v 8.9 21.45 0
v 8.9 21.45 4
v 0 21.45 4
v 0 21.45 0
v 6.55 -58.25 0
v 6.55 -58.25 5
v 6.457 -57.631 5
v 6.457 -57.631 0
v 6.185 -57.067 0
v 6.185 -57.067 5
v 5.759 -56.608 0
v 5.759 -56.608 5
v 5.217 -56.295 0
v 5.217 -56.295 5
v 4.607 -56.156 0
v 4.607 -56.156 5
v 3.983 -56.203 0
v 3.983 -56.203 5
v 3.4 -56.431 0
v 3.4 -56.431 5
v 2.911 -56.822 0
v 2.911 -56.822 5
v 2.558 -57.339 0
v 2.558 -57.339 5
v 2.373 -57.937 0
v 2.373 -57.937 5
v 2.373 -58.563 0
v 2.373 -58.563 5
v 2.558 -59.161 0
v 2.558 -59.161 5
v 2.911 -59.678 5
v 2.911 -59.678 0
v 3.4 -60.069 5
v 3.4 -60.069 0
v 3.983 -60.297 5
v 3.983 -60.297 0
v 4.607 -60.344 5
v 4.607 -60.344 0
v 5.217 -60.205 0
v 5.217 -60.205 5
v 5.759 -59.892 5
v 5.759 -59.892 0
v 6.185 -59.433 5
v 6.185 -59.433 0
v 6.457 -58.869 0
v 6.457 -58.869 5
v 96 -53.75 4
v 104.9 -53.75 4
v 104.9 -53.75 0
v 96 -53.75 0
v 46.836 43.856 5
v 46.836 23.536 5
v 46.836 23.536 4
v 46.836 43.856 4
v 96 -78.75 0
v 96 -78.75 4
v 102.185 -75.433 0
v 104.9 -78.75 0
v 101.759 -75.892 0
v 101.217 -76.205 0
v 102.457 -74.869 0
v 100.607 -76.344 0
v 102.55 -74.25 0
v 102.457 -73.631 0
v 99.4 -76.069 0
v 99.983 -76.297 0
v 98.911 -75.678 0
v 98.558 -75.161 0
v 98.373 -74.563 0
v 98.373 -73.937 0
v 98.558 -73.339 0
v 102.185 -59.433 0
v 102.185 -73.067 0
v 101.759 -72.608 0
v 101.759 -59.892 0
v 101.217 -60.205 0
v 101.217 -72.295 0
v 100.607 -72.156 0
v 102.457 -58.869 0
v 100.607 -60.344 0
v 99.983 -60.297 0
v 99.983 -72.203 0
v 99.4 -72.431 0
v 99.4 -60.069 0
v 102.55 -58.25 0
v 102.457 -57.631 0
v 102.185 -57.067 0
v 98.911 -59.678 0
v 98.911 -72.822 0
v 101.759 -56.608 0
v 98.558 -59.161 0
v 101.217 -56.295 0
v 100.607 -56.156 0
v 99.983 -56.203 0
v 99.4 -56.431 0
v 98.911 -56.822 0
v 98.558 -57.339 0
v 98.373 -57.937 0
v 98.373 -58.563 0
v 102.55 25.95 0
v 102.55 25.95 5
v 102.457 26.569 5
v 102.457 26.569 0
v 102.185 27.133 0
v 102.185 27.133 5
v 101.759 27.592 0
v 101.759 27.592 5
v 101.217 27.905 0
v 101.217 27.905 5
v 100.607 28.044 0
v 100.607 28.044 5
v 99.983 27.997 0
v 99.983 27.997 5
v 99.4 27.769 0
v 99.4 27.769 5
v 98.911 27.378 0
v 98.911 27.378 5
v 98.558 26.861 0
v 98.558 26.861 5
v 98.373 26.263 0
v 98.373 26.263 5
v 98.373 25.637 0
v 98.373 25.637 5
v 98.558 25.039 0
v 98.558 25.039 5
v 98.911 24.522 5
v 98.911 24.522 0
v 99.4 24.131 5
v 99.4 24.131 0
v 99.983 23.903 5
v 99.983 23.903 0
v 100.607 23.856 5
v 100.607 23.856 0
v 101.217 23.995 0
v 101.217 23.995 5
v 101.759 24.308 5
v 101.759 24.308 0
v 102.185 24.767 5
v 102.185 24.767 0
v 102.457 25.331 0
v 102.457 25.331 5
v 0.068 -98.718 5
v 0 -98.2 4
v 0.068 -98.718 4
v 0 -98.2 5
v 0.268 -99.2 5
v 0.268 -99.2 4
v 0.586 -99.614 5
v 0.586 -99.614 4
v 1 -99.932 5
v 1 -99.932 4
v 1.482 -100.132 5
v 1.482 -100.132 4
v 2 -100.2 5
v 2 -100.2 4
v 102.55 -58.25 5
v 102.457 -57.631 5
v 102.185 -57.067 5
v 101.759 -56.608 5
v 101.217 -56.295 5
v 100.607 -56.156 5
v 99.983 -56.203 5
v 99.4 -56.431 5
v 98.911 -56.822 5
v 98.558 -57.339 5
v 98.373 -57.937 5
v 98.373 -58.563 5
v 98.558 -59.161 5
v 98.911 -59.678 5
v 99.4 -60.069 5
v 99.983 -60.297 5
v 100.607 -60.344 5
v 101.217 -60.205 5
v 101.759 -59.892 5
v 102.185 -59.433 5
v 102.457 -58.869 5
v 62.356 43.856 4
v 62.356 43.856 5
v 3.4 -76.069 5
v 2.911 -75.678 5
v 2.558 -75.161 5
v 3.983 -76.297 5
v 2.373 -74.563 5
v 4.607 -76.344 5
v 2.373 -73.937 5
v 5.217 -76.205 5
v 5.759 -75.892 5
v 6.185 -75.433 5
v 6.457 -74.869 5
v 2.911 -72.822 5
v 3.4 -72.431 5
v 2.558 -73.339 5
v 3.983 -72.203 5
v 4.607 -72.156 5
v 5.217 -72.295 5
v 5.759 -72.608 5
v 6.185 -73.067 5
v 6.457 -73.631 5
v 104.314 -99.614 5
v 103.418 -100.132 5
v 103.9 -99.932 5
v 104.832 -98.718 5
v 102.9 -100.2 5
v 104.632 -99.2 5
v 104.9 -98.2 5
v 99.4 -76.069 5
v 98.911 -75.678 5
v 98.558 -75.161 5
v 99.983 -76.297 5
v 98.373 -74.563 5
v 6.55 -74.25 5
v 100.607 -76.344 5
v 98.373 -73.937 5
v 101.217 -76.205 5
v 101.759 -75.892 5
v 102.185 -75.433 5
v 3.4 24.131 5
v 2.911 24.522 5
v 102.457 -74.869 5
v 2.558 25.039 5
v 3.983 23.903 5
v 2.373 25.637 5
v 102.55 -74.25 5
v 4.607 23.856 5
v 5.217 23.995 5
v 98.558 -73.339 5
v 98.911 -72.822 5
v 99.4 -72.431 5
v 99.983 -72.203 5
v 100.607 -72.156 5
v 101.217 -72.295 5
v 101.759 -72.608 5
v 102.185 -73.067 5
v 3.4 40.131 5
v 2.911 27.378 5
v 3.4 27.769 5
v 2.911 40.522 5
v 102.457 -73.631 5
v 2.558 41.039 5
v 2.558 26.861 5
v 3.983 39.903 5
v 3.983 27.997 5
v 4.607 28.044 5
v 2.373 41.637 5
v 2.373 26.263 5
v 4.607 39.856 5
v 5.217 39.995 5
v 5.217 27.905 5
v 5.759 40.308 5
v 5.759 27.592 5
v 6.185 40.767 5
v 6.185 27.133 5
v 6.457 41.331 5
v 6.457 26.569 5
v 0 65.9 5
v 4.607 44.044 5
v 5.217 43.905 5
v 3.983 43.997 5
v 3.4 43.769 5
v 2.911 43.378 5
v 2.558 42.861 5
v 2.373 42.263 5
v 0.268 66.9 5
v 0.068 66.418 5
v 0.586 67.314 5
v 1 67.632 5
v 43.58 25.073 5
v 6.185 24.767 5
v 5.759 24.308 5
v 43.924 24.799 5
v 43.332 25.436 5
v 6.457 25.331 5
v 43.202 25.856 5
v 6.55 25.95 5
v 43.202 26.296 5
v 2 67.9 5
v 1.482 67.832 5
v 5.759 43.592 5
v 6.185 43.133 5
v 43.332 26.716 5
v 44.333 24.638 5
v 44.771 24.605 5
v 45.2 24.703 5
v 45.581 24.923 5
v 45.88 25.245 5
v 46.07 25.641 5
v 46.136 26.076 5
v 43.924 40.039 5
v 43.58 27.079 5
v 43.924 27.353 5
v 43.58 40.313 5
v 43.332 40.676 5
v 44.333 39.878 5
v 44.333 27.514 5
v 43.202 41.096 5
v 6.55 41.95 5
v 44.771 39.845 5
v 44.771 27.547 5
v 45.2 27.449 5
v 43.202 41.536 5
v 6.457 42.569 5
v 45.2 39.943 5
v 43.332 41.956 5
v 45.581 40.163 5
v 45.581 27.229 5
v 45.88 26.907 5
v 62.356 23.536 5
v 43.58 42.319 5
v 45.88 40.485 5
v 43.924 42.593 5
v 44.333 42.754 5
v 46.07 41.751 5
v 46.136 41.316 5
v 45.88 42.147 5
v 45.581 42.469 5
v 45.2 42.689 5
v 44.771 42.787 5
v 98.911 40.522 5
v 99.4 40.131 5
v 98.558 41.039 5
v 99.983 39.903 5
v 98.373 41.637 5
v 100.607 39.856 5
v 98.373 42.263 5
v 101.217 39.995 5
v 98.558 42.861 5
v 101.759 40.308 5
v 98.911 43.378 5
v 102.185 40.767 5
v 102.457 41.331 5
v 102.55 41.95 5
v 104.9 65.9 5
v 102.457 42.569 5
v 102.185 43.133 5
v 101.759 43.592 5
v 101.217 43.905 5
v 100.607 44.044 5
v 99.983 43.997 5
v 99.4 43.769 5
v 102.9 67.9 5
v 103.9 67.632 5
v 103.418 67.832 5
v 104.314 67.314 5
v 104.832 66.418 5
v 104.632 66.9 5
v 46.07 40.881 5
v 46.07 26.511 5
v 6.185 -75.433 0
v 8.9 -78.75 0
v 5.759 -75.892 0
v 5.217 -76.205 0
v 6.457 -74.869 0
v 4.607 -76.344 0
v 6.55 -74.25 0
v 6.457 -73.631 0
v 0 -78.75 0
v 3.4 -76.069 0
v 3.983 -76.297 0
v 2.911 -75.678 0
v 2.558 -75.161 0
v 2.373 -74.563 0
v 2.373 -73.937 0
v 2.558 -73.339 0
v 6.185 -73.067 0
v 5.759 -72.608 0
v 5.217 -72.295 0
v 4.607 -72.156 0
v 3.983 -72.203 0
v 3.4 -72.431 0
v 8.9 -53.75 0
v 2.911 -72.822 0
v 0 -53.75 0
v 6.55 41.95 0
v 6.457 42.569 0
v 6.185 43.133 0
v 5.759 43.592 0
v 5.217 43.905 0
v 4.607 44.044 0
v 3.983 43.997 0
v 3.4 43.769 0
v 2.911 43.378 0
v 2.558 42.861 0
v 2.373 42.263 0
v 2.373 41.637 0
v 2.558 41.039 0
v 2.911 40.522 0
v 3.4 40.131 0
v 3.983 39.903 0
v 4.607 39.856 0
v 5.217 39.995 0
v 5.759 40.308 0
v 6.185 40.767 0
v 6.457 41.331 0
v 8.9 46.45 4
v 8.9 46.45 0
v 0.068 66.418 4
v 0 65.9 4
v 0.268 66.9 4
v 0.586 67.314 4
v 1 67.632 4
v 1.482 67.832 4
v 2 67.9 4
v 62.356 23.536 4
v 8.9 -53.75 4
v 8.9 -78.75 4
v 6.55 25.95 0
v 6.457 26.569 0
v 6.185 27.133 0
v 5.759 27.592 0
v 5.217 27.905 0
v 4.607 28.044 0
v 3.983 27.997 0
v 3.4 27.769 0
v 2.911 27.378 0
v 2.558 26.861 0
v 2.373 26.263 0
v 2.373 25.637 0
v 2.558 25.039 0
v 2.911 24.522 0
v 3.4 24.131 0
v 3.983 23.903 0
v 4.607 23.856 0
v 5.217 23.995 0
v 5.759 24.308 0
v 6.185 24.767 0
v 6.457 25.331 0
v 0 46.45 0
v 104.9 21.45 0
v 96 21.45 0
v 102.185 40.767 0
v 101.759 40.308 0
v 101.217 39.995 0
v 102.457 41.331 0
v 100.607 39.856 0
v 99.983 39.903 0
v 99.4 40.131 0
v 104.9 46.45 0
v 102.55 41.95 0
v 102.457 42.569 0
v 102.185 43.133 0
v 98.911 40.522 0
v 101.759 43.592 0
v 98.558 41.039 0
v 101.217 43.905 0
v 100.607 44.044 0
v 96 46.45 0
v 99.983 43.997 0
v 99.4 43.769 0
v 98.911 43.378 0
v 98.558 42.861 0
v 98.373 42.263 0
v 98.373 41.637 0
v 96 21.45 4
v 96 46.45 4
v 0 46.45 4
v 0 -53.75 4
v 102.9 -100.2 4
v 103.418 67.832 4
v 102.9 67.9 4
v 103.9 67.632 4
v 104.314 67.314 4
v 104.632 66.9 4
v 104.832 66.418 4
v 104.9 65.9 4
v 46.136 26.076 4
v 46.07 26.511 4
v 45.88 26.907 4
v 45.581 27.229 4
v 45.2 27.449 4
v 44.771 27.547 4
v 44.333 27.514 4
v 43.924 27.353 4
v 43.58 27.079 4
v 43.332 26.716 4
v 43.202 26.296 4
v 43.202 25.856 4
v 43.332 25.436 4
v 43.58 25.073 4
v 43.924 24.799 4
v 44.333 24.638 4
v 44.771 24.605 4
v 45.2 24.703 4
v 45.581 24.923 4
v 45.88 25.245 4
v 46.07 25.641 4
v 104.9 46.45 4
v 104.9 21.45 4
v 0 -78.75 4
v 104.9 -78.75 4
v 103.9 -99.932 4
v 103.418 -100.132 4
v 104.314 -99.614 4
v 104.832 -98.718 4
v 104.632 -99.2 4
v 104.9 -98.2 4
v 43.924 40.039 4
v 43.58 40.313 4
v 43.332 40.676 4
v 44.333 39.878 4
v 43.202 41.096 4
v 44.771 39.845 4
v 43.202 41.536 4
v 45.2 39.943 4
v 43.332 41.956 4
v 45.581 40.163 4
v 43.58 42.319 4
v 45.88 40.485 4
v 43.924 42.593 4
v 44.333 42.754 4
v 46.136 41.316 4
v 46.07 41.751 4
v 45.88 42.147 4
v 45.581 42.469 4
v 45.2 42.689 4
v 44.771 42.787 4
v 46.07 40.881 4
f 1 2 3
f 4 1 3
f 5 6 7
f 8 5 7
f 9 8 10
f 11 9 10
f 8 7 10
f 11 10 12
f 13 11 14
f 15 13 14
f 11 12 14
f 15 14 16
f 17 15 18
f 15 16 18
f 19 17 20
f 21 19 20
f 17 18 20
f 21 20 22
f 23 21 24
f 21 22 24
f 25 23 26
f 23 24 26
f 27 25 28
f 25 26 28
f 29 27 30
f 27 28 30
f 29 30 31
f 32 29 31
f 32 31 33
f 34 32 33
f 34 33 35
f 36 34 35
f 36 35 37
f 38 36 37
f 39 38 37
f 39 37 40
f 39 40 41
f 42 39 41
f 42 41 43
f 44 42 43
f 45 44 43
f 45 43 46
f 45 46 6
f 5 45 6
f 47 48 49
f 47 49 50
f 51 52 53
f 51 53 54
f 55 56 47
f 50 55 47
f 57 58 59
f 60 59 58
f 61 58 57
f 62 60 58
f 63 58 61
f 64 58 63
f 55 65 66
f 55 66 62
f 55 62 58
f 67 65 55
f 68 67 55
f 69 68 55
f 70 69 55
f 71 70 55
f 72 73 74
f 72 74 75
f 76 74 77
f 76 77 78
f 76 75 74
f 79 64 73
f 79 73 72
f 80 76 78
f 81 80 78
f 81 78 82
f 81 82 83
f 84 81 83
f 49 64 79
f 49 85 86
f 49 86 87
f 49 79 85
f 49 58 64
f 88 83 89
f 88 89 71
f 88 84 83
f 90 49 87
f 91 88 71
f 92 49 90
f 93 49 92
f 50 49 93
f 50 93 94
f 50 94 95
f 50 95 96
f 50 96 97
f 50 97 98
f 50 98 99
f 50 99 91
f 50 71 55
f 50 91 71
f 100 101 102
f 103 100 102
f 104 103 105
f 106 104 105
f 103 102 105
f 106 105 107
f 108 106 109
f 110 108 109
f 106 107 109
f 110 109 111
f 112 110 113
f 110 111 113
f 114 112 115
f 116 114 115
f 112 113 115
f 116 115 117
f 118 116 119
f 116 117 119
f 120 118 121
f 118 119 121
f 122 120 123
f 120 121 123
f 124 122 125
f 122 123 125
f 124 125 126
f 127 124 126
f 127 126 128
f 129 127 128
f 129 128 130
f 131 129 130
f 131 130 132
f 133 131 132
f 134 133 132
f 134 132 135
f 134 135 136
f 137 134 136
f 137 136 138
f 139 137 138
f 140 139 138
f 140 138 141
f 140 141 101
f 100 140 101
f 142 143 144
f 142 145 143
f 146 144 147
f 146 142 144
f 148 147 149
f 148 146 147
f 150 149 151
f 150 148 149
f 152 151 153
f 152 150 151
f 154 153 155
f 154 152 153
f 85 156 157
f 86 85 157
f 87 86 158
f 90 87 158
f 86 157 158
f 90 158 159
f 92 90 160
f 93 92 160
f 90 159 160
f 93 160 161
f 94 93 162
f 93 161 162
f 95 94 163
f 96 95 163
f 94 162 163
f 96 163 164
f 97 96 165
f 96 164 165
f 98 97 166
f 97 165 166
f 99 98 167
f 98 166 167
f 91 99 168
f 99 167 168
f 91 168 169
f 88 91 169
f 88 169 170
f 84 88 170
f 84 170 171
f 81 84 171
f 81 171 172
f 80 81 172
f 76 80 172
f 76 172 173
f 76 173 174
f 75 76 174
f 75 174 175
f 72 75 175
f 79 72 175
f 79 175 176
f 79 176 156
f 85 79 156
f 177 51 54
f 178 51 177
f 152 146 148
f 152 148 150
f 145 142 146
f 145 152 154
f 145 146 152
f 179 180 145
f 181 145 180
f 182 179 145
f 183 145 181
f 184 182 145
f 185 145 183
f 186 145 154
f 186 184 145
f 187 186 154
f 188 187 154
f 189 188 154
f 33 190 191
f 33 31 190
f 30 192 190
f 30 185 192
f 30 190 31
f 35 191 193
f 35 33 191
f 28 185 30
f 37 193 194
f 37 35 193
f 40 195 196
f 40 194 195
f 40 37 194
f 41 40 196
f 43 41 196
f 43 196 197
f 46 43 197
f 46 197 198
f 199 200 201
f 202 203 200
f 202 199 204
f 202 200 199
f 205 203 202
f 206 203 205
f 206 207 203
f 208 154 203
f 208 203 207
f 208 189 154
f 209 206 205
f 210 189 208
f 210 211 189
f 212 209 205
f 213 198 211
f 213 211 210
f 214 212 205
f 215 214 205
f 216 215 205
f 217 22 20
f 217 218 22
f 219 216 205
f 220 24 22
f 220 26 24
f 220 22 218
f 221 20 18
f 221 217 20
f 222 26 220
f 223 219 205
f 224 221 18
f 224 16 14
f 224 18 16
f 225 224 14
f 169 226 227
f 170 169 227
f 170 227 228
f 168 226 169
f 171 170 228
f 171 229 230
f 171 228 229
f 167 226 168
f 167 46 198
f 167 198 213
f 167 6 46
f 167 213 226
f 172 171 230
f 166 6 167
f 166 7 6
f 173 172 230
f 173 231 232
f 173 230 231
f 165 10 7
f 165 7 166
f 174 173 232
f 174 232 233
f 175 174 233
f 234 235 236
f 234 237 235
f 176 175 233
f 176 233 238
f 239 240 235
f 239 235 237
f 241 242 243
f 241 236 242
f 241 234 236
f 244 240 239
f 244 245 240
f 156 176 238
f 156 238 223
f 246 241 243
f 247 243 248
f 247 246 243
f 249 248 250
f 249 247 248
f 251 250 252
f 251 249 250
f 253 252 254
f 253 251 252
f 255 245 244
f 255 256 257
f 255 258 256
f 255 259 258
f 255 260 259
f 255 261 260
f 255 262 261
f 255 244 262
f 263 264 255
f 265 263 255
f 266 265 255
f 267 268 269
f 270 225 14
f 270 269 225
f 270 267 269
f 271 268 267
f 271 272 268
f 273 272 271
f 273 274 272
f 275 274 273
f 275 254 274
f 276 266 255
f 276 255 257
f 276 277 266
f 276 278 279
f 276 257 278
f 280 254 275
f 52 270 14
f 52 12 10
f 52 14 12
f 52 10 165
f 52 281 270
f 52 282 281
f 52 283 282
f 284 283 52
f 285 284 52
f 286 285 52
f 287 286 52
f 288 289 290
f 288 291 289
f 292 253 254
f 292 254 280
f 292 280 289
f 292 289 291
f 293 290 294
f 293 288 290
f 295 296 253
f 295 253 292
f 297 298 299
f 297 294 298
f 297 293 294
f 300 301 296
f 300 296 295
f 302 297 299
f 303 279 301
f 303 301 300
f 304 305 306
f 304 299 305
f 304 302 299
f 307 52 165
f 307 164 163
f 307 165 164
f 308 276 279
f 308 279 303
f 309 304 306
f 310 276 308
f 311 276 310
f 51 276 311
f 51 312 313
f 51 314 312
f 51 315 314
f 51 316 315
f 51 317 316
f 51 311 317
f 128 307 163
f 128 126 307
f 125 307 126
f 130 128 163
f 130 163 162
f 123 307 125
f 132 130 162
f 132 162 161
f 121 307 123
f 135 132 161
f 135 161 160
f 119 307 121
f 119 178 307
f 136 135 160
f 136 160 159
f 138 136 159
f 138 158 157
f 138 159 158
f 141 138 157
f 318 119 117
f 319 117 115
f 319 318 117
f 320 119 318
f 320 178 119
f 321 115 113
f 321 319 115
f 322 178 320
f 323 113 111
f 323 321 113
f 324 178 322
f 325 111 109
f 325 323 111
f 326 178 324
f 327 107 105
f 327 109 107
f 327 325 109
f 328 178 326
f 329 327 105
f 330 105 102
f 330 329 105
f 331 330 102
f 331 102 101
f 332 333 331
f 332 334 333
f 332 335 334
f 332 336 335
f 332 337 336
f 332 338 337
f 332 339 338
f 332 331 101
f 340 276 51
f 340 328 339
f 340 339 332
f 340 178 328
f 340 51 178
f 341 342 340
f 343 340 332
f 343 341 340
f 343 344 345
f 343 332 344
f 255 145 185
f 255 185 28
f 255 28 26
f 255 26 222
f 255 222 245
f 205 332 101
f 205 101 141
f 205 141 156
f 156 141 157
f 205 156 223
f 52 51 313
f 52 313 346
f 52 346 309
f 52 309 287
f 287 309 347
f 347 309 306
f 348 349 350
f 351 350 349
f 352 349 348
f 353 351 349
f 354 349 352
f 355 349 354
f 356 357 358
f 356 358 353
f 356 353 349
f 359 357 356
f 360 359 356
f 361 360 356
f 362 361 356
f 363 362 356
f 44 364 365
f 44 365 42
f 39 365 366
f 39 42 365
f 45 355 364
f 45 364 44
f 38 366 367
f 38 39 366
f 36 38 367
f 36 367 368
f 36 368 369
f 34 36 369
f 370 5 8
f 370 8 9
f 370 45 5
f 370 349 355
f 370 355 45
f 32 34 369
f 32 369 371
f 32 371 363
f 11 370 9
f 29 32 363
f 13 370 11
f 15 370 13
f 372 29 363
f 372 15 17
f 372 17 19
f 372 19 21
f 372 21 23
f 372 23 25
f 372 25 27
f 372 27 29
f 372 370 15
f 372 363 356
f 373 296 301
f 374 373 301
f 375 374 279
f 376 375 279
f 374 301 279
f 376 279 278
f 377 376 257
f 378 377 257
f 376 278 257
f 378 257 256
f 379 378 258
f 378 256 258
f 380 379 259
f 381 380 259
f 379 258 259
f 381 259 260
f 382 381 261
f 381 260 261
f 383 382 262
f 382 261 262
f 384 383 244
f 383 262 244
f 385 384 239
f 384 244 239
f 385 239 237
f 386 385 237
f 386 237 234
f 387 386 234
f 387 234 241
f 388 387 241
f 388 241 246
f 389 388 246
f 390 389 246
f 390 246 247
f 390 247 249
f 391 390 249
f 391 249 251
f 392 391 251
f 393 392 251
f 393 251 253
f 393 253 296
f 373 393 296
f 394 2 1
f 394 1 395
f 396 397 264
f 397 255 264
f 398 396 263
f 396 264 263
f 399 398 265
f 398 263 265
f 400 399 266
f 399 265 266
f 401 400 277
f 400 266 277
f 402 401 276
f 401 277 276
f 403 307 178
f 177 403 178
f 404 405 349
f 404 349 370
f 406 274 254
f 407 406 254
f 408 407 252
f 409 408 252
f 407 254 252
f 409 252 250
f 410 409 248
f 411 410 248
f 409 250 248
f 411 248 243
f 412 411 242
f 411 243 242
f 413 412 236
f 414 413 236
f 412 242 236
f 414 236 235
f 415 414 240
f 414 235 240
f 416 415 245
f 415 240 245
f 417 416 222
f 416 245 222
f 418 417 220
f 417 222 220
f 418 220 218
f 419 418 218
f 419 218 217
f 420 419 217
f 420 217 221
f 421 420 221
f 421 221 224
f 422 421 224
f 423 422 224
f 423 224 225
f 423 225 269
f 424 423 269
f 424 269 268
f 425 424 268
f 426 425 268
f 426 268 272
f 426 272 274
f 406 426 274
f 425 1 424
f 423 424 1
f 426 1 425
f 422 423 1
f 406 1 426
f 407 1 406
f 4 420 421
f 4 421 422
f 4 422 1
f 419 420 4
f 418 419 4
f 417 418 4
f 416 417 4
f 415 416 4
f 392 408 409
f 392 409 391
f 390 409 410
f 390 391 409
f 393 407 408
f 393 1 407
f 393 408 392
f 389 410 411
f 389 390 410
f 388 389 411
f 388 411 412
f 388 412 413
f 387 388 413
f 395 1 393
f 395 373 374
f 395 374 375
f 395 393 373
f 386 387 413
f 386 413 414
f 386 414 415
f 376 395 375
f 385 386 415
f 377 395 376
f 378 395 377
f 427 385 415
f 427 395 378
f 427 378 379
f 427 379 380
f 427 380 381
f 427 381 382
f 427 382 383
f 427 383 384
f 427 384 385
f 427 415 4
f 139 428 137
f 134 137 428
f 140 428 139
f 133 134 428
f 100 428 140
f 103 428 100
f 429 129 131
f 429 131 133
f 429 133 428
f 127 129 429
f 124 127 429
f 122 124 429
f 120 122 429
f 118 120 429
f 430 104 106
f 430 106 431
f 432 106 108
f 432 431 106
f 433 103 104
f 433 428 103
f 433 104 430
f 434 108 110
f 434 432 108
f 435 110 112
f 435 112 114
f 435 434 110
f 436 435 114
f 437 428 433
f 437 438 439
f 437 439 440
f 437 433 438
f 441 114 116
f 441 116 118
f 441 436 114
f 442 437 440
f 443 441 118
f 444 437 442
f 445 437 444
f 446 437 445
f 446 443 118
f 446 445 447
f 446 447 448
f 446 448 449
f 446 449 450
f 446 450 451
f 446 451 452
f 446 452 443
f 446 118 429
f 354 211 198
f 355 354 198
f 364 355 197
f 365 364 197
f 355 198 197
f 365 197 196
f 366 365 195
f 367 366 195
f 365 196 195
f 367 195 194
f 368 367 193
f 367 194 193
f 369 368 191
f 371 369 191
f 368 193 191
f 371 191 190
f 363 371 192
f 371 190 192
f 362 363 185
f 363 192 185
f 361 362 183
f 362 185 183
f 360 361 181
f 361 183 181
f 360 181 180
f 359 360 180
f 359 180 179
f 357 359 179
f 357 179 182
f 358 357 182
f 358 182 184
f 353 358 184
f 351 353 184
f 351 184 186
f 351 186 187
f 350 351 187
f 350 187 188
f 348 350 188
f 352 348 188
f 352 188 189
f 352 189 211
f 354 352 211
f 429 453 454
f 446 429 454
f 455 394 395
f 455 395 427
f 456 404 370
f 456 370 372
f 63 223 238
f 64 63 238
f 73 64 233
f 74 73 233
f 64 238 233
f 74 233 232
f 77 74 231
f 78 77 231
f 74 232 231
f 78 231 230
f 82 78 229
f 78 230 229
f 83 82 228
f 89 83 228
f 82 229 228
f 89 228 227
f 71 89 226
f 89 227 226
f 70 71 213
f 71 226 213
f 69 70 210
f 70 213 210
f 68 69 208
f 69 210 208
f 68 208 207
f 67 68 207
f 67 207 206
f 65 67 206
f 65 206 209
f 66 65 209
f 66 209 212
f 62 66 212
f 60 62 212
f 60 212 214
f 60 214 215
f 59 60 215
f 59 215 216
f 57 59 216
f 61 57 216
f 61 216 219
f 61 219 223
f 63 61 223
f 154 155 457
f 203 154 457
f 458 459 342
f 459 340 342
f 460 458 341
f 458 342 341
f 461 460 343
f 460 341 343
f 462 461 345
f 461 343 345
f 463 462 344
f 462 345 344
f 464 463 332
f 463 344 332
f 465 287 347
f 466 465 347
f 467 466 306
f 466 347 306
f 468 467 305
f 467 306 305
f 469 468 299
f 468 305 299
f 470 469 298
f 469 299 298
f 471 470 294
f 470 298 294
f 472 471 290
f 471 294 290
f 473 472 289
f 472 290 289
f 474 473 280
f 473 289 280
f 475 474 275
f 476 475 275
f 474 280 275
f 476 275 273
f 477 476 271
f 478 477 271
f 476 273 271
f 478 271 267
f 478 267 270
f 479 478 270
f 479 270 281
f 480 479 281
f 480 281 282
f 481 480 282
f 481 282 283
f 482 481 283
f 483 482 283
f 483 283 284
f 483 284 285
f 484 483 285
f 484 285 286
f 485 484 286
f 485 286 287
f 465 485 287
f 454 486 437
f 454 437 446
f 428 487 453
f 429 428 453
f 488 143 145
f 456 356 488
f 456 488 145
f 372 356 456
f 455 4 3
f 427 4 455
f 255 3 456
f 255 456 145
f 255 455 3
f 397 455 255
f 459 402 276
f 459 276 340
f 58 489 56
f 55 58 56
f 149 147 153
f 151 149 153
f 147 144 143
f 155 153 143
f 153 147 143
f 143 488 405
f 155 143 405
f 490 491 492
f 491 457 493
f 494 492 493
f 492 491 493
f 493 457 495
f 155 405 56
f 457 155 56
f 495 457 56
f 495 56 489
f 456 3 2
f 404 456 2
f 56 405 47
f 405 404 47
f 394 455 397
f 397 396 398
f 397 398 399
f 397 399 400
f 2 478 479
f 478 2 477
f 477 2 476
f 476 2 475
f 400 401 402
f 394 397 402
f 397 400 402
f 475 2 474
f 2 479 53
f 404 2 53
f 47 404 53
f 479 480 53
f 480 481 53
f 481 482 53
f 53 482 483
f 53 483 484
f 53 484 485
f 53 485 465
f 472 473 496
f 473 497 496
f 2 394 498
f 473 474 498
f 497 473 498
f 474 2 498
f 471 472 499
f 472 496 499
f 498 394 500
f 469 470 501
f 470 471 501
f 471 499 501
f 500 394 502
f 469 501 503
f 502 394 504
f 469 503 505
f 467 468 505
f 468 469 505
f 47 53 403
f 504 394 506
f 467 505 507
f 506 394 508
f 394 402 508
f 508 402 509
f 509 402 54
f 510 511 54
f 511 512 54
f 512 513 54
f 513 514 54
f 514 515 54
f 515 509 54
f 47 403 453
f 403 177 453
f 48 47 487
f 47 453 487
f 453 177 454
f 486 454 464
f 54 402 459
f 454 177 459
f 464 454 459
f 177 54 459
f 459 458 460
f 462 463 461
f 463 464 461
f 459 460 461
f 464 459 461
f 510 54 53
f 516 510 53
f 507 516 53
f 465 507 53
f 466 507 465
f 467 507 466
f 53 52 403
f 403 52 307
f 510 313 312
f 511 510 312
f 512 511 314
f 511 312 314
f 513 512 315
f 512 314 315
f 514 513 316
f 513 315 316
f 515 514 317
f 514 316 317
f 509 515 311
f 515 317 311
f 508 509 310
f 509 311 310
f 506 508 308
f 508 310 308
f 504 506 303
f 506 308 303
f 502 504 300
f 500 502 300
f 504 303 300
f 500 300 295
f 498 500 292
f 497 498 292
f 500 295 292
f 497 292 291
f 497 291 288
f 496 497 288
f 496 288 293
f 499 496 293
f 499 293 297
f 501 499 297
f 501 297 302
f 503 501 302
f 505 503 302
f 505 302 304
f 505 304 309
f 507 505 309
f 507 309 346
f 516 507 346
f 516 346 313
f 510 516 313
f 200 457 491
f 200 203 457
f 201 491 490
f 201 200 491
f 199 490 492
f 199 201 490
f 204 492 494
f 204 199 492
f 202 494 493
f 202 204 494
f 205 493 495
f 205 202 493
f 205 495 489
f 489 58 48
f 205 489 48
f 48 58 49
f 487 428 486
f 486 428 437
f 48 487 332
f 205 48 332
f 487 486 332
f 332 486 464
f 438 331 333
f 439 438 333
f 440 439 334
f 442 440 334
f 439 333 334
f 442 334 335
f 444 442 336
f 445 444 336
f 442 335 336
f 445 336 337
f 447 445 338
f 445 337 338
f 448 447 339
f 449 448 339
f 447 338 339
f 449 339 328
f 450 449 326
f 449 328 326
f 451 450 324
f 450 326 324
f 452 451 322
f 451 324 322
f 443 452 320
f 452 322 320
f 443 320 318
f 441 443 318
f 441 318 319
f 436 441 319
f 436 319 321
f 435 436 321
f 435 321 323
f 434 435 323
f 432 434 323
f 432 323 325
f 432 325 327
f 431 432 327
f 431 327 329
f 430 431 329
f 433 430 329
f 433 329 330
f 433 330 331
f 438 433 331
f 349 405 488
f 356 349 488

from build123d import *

# Parameters (mm, degrees)
BOSS_EXTRUDE1_START = 4
SKETCH1_W           = 104.9
SKETCH1_H           = 168.1
BOSS_EXTRUDE1_DEPTH = 1
SKETCH2_W           = 8.9
SKETCH2_H           = 25
BOSS_EXTRUDE2_DEPTH = 4
SKETCH5_R           = 2.1
CUT_EXTRUDE5_DEPTH  = 6
CUT_EXTRUDE3_REACH  = 7
SKETCH3_R           = 1.475
SKETCH3_W           = 15.52
SKETCH3_H           = 20.32
FILLET1_R           = 2


with BuildPart() as part:
    # Sketch1 → Boss-Extrude1 (new body)
    with BuildSketch(Plane.XY.offset(BOSS_EXTRUDE1_START)):
        with Locations((52.45, -16.15)):
            Rectangle(SKETCH1_W, SKETCH1_H)
    extrude(amount=BOSS_EXTRUDE1_DEPTH)

    # Sketch2 → Boss-Extrude2 (add)
    with BuildSketch(Plane(origin=(0, 0, 4), x_dir=(-1, 0, 0), z_dir=(0, 0, -1))):
        with Locations((-100.45, 33.95)):
            Rectangle(SKETCH2_W, SKETCH2_H)
        with Locations((-4.45, 33.95)):
            Rectangle(SKETCH2_W, SKETCH2_H)
        with Locations((-4.45, -66.25)):
            Rectangle(SKETCH2_W, SKETCH2_H)
        with Locations((-100.45, -66.25)):
            Rectangle(SKETCH2_W, SKETCH2_H)
    extrude(amount=BOSS_EXTRUDE2_DEPTH)

    # Sketch5 → Cut-Extrude5 (cut, through all)
    with BuildSketch(Plane.XY.offset(5)):
        with Locations((100.45, -74.25)):
            Circle(SKETCH5_R)
        with Locations((100.45, -58.25)):
            Circle(SKETCH5_R)
        with Locations((4.45, -74.25)):
            Circle(SKETCH5_R)
        with Locations((4.45, -58.25)):
            Circle(SKETCH5_R)
        with Locations((4.45, 25.95)):
            Circle(SKETCH5_R)
        with Locations((4.45, 41.95)):
            Circle(SKETCH5_R)
        with Locations((100.45, 25.95)):
            Circle(SKETCH5_R)
        with Locations((100.45, 41.95)):
            Circle(SKETCH5_R)
    extrude(amount=-CUT_EXTRUDE5_DEPTH, mode=Mode.SUBTRACT)

    # Sketch3 → Cut-Extrude3 (cut, up to next)
    with BuildSketch(Plane.XY.offset(5), mode=Mode.PRIVATE) as cut_extrude3_sk1:
        with Locations((44.661, 26.076)):
            Circle(SKETCH3_R)
    cut_extrude3_tool1 = extrude(cut_extrude3_sk1.sketch, amount=-CUT_EXTRUDE3_REACH, mode=Mode.PRIVATE) & part.part
    add(cut_extrude3_tool1.solids().sort_by_distance((44.661, 26.076, 5))[0], mode=Mode.SUBTRACT)
    # Sketch3 → Cut-Extrude3 (cut, up to next)
    with BuildSketch(Plane.XY.offset(5), mode=Mode.PRIVATE) as cut_extrude3_sk2:
        with Locations((44.661, 41.316)):
            Circle(SKETCH3_R)
    cut_extrude3_tool2 = extrude(cut_extrude3_sk2.sketch, amount=-CUT_EXTRUDE3_REACH, mode=Mode.PRIVATE) & part.part
    add(cut_extrude3_tool2.solids().sort_by_distance((44.661, 41.316, 5))[0], mode=Mode.SUBTRACT)
    # Sketch3 → Cut-Extrude3 (cut, up to next)
    with BuildSketch(Plane.XY.offset(5), mode=Mode.PRIVATE) as cut_extrude3_sk3:
        with Locations((54.596, 33.696)):
            Rectangle(SKETCH3_W, SKETCH3_H)
    cut_extrude3_tool3 = extrude(cut_extrude3_sk3.sketch, amount=-CUT_EXTRUDE3_REACH, mode=Mode.PRIVATE) & part.part
    add(cut_extrude3_tool3.solids().sort_by_distance((54.596, 33.696, 5))[0], mode=Mode.SUBTRACT)

    # Fillet1
    fillet1_edges = [part.edges().sort_by_distance(p)[0] for p in [
        (0, 67.9, 4.5),
        (104.9, 67.9, 4.5),
        (104.9, -100.2, 4.5),
        (0, -100.2, 4.5),
    ]]
    fillet(fillet1_edges, radius=FILLET1_R)


solid = part.part
